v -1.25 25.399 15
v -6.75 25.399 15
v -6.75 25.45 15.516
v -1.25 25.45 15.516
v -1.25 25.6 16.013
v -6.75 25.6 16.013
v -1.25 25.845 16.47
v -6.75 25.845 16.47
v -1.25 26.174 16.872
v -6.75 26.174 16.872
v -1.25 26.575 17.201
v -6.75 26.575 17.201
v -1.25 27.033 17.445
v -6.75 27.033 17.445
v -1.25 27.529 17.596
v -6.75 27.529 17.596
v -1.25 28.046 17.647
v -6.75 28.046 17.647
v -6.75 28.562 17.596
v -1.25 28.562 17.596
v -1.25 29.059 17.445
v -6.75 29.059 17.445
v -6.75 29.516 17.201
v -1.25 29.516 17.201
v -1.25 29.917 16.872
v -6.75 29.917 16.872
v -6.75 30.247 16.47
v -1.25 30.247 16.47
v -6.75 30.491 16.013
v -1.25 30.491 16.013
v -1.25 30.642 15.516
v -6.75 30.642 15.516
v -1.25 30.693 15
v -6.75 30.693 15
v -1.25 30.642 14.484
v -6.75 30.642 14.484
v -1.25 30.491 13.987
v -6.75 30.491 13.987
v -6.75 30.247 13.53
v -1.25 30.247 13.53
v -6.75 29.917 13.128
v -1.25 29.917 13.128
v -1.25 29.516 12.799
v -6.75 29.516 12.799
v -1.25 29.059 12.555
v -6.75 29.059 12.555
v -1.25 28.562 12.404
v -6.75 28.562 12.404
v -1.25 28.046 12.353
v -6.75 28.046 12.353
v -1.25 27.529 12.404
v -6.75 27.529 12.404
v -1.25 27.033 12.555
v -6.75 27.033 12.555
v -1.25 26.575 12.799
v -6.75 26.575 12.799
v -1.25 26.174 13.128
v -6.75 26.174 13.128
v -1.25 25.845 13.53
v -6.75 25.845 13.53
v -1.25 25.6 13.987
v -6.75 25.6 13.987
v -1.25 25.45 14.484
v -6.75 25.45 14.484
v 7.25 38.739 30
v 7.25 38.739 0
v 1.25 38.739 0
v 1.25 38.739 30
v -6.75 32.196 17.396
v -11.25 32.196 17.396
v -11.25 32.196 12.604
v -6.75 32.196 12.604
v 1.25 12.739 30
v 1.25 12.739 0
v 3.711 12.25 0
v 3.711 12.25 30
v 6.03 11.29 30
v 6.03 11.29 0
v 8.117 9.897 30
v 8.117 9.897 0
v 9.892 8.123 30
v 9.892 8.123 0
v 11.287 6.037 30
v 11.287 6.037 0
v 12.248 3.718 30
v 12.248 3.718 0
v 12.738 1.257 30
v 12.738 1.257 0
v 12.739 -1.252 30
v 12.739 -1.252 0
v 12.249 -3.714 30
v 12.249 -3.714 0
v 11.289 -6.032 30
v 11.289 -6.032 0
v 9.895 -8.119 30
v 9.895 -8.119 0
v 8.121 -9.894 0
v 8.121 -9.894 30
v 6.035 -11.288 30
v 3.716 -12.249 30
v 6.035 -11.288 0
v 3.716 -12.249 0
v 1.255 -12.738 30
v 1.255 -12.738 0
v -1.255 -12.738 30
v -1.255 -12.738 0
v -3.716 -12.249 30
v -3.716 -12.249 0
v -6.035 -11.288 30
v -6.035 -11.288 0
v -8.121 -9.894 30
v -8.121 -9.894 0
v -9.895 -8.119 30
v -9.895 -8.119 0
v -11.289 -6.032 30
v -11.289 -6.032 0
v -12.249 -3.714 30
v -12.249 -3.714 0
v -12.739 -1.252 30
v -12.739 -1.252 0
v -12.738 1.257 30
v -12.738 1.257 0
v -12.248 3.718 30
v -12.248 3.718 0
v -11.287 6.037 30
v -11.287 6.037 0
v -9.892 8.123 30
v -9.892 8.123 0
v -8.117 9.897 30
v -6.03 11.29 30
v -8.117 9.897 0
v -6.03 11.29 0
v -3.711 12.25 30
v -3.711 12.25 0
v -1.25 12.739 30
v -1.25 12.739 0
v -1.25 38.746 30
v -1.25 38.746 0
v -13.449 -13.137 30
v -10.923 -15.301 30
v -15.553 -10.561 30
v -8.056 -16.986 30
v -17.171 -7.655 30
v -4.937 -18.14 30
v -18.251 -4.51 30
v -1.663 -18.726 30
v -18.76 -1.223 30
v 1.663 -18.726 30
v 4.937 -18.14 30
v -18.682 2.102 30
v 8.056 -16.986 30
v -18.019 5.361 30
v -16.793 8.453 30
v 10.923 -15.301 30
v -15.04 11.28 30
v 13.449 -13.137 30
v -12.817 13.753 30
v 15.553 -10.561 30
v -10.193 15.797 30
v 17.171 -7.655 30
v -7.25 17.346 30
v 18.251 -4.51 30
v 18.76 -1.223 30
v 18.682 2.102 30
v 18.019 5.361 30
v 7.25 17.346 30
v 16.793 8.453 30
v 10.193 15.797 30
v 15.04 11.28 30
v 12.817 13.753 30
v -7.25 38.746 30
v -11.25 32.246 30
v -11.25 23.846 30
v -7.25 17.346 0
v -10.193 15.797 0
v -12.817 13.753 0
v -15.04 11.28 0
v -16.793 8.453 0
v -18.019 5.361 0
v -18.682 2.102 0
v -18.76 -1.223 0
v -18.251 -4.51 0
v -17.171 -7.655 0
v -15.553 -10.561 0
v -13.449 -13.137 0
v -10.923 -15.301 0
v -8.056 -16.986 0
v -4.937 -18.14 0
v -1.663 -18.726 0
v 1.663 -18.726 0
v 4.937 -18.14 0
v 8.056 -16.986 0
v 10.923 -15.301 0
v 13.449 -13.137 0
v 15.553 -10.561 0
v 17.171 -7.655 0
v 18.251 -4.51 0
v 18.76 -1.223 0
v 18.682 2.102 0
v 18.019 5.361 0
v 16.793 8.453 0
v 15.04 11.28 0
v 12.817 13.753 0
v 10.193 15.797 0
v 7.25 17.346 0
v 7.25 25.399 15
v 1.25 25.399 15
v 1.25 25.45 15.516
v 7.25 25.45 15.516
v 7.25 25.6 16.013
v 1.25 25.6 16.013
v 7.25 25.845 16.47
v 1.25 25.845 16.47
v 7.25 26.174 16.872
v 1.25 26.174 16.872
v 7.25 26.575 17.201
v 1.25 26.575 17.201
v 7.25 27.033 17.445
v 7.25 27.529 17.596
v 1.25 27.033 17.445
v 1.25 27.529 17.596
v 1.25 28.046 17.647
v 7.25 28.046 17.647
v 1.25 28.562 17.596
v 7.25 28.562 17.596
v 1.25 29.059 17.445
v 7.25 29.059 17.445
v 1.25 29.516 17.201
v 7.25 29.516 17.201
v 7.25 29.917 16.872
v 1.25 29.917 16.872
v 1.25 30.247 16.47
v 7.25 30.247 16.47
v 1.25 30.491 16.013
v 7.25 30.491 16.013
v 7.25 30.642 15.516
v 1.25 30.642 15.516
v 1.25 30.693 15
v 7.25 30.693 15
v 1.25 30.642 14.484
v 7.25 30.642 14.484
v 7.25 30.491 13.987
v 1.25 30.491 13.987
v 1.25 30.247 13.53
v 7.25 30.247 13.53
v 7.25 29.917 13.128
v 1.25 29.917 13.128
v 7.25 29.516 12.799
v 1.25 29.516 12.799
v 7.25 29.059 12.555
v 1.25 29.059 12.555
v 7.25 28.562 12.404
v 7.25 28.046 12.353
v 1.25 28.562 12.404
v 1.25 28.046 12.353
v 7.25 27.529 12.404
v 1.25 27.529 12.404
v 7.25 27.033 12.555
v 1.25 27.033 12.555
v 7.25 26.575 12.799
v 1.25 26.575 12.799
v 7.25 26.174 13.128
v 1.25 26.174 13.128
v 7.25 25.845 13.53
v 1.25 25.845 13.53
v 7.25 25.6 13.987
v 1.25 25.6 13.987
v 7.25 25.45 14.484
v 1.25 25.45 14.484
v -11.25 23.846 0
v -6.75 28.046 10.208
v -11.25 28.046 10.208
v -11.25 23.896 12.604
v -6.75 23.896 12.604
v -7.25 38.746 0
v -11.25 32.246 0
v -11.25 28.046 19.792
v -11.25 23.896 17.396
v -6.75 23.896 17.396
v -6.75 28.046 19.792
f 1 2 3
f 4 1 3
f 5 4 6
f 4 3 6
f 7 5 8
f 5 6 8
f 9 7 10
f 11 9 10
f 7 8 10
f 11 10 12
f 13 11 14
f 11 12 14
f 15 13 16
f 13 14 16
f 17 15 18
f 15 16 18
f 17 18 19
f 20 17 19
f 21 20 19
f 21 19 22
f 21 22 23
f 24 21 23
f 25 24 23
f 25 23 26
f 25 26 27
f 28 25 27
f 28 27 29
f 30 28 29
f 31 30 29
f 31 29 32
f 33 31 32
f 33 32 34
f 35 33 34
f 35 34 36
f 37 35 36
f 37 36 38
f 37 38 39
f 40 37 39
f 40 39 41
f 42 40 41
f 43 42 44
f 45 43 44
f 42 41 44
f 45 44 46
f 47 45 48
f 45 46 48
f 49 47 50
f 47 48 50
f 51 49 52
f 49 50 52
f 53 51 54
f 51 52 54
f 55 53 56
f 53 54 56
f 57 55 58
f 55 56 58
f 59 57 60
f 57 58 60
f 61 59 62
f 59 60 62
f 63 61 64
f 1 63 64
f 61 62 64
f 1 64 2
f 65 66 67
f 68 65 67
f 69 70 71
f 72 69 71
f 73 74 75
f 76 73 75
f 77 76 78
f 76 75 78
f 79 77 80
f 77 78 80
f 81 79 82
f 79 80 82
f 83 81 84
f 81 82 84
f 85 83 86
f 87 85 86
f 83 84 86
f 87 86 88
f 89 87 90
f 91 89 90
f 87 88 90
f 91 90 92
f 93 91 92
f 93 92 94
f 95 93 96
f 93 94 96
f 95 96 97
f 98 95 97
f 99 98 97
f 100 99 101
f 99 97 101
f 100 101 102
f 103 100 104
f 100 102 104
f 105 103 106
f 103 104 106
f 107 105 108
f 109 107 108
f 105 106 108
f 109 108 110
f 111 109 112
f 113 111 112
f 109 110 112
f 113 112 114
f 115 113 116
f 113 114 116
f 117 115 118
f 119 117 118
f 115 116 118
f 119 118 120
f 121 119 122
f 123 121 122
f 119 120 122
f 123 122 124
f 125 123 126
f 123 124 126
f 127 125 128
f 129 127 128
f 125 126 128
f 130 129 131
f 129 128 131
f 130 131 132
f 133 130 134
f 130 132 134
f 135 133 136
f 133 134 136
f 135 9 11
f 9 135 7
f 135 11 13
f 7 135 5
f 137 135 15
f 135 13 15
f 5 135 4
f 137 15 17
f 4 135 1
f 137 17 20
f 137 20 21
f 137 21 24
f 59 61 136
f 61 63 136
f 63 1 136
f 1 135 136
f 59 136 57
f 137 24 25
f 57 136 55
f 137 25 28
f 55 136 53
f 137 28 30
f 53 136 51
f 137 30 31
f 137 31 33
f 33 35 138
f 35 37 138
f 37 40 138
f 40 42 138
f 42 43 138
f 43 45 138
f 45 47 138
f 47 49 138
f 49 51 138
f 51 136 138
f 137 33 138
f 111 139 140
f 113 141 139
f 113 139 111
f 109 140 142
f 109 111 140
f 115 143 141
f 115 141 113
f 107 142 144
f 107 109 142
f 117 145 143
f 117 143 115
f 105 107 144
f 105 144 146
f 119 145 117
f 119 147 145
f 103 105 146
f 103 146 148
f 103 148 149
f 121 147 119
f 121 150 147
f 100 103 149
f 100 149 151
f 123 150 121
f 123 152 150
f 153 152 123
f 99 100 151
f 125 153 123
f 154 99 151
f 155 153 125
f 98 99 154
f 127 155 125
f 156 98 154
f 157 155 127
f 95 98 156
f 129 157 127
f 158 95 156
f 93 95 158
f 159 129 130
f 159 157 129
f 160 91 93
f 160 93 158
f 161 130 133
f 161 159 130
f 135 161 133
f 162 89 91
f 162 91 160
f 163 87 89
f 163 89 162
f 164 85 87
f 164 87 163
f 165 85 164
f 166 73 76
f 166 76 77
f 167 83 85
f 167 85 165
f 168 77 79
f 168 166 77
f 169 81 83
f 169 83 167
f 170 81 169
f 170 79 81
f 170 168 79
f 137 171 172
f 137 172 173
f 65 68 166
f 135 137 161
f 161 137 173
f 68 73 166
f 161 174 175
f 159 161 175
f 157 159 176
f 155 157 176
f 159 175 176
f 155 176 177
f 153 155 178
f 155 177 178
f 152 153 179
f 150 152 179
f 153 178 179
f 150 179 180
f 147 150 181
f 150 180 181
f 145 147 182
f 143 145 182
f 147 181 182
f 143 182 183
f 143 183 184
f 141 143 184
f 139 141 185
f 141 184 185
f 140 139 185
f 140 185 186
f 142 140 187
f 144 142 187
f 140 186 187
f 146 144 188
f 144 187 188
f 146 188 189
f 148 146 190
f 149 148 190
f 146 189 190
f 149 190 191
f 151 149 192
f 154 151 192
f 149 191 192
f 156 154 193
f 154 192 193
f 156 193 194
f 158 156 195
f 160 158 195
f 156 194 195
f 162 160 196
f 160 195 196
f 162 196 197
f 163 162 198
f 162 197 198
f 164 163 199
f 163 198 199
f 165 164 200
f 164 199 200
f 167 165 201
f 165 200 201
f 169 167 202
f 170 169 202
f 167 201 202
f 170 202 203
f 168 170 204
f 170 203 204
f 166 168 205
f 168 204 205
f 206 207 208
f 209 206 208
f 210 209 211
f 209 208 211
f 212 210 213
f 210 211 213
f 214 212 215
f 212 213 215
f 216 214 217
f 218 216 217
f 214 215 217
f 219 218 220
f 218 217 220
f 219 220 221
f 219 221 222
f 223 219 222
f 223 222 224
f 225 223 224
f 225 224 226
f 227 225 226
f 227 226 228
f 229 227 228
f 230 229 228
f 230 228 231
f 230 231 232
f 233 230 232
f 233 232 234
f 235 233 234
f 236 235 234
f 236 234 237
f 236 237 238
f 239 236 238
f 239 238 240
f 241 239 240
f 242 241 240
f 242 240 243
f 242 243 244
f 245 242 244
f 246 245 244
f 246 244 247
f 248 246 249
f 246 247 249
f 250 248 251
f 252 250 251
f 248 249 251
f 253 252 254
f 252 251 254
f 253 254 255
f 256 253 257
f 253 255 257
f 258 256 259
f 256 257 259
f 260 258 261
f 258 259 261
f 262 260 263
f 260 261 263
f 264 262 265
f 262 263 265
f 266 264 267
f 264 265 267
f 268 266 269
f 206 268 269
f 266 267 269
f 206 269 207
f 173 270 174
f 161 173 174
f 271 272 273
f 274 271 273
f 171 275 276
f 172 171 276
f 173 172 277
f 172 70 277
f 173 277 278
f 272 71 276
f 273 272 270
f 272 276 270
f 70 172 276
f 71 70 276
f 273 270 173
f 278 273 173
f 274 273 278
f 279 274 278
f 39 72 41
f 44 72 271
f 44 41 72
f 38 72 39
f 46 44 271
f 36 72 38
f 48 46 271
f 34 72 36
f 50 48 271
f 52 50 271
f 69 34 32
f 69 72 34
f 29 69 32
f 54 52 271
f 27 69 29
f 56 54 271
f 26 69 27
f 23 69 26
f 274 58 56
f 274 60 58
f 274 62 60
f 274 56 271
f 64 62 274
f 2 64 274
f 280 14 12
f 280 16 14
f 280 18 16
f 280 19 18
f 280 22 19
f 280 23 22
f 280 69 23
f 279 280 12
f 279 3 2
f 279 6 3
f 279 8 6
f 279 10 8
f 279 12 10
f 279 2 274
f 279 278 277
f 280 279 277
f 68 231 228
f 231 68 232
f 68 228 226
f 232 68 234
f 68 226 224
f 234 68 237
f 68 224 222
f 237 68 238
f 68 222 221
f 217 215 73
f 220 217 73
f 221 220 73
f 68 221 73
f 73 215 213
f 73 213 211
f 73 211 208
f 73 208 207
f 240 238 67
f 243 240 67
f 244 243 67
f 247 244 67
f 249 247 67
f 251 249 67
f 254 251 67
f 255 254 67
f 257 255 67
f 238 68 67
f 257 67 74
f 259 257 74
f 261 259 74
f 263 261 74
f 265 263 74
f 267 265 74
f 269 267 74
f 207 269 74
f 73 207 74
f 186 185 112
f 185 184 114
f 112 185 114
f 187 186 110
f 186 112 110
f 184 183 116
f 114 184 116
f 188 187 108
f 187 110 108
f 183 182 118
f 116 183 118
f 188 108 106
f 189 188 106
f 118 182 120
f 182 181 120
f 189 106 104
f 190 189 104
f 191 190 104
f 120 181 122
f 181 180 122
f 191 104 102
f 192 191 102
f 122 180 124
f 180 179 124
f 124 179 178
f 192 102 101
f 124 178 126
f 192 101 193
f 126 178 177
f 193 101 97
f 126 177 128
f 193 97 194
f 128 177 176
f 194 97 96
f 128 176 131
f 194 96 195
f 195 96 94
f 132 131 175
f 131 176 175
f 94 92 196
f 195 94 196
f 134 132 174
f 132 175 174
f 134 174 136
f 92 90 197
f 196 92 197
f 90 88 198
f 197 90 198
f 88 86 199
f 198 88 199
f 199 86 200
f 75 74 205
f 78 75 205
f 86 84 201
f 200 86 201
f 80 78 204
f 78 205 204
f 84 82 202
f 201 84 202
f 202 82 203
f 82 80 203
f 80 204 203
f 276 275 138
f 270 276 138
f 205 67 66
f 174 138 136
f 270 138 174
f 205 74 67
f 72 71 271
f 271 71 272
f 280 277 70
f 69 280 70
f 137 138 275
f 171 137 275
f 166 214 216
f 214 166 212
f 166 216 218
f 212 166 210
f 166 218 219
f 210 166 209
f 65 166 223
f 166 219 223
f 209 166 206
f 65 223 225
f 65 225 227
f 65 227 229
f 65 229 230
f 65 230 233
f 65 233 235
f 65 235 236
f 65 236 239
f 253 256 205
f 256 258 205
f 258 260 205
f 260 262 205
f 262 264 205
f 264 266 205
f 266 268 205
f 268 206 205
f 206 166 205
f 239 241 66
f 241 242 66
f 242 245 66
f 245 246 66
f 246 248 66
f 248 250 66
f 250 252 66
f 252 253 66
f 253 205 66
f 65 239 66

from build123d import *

# Parameters (mm, degrees)
F1_DEPTH = 30
F3_DEPTH = 4.5
F4_R     = 2.646799
F5_DEPTH = 25.551


with BuildPart() as f1:
    # F0 (on Top) → F1 (new body)
    with BuildSketch(Plane.XY):
        with BuildLine():
            ThreePointArc((1.25, 12.738819), (0, -12.8), (-1.25, 12.738819))
            Line((-1.25, 12.738819), (-1.25, 38.745821))
            Line((-1.25, 38.745821), (-7.25, 38.745821))
            Line((-7.25, 38.745821), (-7.25, 17.345821))
            ThreePointArc((-7.25, 17.345821), (0, -18.8), (7.25, 17.345821))
            Line((7.25, 17.345821), (7.25, 38.738819))
            Line((7.25, 38.738819), (1.25, 38.738819))
            Line((1.25, 38.738819), (1.25, 12.738819))
        make_face()
        Polygon((-7.25, 17.345821), (-7.25, 38.745821), (-11.25, 32.245821), (-11.25, 23.845821), align=None)
    extrude(amount=F1_DEPTH)

    # F2 (on face) → F3 (cut)
    with BuildSketch(Plane(origin=(-11.25, 0, 0), x_dir=(0, -1, 0), z_dir=(-1, 0, 0))):
        Polygon((-32.195821, 17.396004), (-32.195821, 12.603996), (-28.045821, 10.207993), (-23.895821, 12.603996), (-23.895821, 17.396004), (-28.045821, 19.792007), align=None)
    extrude(amount=-F3_DEPTH, mode=Mode.SUBTRACT)

    # F4 (on face) → F5 (cut, through all)
    with BuildSketch(Plane(origin=(-6.75, 0, 0), x_dir=(0, -1, 0), z_dir=(-1, 0, 0))):
        with Locations((-28.045821, 15)):
            Circle(F4_R)
    extrude(amount=-F5_DEPTH, mode=Mode.SUBTRACT)


solid = f1.part
